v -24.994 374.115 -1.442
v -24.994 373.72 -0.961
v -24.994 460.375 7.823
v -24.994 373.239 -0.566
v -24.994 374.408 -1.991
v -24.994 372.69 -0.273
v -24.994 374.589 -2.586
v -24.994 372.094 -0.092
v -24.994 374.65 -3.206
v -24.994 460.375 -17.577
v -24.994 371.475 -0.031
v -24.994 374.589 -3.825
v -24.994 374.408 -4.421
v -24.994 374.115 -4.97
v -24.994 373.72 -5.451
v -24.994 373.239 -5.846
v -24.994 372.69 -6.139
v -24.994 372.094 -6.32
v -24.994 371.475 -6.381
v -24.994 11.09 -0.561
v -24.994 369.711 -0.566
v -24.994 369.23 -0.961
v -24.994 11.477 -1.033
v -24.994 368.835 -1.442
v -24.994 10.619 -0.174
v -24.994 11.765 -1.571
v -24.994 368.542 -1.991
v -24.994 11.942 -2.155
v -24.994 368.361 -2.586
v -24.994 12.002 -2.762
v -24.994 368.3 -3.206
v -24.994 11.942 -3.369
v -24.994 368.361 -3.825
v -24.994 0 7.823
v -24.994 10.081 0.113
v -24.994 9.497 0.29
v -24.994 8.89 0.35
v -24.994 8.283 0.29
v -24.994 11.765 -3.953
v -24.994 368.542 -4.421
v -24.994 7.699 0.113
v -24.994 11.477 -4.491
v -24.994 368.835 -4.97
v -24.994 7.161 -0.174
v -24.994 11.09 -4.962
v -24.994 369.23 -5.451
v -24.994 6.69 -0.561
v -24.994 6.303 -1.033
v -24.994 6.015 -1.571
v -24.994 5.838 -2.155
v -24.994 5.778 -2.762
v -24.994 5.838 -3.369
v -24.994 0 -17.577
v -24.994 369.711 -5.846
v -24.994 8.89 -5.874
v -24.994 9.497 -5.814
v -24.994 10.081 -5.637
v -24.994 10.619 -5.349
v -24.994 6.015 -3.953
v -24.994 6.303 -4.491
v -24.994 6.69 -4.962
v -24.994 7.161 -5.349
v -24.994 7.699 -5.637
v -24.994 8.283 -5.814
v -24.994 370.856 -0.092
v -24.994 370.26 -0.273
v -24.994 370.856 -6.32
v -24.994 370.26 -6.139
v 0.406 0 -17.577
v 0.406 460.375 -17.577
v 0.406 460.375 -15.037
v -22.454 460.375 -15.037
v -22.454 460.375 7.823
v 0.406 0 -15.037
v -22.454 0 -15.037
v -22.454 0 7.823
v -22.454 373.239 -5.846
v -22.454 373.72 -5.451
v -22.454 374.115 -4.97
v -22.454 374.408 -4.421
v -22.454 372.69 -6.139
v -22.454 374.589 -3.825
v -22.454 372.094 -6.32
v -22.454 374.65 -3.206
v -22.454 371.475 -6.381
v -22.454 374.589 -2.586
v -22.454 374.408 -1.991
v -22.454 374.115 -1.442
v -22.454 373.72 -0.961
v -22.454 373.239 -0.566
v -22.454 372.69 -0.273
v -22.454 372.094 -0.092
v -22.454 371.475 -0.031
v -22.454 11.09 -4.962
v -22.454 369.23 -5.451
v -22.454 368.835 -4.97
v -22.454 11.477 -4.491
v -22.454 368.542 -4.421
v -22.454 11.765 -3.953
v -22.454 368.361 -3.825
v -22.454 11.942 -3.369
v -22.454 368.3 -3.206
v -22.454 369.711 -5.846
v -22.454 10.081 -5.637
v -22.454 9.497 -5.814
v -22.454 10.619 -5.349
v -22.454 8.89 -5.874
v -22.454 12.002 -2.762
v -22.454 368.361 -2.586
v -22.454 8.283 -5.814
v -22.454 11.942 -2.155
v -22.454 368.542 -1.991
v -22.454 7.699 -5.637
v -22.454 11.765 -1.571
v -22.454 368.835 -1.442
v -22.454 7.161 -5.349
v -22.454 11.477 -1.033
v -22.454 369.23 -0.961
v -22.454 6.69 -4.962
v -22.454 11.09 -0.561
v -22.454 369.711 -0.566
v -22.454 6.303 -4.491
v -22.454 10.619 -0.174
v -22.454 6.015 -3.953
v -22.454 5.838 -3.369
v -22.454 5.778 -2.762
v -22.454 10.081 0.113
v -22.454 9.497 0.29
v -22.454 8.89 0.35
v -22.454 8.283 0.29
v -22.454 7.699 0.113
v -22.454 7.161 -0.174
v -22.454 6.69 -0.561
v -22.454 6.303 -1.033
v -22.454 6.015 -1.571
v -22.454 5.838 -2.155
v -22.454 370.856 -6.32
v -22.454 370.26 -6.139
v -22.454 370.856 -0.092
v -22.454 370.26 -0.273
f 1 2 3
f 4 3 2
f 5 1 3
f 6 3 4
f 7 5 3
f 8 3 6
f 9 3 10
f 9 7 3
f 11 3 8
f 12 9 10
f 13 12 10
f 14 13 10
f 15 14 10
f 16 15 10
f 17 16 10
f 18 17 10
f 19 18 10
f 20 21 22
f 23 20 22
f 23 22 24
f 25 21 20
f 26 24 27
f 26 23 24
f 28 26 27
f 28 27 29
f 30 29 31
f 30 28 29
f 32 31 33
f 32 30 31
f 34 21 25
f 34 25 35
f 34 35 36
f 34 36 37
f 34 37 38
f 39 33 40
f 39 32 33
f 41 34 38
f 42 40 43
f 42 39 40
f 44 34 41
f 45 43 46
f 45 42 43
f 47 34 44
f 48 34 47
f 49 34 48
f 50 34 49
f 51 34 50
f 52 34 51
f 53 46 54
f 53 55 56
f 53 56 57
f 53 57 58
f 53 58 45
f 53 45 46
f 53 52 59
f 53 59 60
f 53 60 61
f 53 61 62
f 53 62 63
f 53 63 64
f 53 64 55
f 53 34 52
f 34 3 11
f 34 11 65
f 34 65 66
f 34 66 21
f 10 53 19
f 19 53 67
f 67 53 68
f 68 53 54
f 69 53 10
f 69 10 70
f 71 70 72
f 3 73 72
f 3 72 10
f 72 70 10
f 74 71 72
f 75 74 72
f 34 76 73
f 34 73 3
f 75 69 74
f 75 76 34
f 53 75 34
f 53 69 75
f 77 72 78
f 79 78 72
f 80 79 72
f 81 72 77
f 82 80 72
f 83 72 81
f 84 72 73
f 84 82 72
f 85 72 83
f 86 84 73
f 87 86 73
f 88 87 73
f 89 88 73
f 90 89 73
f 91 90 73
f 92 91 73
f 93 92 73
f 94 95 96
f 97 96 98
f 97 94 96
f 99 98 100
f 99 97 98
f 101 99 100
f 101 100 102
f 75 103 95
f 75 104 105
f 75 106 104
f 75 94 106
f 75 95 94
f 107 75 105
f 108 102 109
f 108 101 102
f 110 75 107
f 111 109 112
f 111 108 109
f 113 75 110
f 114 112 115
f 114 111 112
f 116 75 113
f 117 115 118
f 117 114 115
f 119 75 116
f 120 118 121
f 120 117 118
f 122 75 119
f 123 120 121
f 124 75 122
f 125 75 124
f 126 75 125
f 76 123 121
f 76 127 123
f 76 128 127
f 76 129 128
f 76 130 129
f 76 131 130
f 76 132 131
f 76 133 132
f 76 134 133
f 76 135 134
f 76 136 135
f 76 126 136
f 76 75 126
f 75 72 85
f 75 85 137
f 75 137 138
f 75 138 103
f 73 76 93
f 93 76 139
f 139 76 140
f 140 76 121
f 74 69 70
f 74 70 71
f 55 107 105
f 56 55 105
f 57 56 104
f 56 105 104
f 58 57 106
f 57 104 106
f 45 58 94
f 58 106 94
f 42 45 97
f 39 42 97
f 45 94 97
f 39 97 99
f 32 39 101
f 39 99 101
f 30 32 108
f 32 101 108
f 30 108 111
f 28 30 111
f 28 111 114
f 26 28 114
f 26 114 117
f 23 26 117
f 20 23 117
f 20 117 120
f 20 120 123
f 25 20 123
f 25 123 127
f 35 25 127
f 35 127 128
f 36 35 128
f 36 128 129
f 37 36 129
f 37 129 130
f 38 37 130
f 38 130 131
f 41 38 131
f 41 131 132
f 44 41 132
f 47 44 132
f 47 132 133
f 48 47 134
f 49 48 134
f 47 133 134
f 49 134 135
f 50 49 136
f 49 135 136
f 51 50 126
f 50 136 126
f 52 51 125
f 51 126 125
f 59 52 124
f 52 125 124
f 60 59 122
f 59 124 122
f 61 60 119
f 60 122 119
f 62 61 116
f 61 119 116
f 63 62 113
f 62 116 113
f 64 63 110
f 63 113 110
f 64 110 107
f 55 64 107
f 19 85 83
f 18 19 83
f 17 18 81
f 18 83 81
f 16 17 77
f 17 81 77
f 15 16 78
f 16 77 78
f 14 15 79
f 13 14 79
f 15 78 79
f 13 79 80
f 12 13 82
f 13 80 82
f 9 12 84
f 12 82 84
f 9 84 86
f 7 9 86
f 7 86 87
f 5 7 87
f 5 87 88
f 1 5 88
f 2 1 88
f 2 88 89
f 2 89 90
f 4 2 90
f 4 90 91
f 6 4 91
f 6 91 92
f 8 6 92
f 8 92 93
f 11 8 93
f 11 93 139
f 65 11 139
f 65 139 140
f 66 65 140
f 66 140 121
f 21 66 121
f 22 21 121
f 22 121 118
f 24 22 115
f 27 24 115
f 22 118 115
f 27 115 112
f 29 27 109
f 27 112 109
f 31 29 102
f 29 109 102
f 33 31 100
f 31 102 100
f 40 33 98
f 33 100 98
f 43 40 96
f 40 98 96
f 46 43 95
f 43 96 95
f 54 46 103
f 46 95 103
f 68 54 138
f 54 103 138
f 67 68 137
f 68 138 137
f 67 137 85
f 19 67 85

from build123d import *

# Parameters (mm, degrees)
EXTRUDE_THIN1_DEPTH = 460.375
SKETCH3_R           = 3.175
CUT_EXTRUDE1_DEPTH  = 462.277209629
SKETCH4_R           = 3.111919631
CUT_EXTRUDE2_DEPTH  = 462.277209629


with BuildPart() as part:
    # Sketch1 → Extrude-Thin1 (new body)
    with BuildSketch(Plane(origin=(0, 0, 0), x_dir=(1, 0, 0), z_dir=(0, 1, 0))):
        Polygon((-24.9936, -7.8232), (-24.9936, 17.5768), (0.4064, 17.5768), (0.4064, 15.0368), (-22.4536, 15.0368), (-22.4536, -7.8232), align=None)
    extrude(amount=EXTRUDE_THIN1_DEPTH)

    # Sketch3 → Cut-Extrude1 (cut, through all)
    with BuildSketch(Plane(origin=(-22.4536, 0, 0), x_dir=(0, 0, -1), z_dir=(1, 0, 0))):
        with Locations((3.205834921, 371.475)):
            Circle(SKETCH3_R)
    extrude(amount=-CUT_EXTRUDE1_DEPTH, mode=Mode.SUBTRACT)

    # Sketch4 → Cut-Extrude2 (cut, through all)
    with BuildSketch(Plane(origin=(-22.4536, 0, 0), x_dir=(0, 0, -1), z_dir=(1, 0, 0))):
        with Locations((2.761783971, 8.89)):
            Circle(SKETCH4_R)
    extrude(amount=-CUT_EXTRUDE2_DEPTH, mode=Mode.SUBTRACT)


solid = part.part
